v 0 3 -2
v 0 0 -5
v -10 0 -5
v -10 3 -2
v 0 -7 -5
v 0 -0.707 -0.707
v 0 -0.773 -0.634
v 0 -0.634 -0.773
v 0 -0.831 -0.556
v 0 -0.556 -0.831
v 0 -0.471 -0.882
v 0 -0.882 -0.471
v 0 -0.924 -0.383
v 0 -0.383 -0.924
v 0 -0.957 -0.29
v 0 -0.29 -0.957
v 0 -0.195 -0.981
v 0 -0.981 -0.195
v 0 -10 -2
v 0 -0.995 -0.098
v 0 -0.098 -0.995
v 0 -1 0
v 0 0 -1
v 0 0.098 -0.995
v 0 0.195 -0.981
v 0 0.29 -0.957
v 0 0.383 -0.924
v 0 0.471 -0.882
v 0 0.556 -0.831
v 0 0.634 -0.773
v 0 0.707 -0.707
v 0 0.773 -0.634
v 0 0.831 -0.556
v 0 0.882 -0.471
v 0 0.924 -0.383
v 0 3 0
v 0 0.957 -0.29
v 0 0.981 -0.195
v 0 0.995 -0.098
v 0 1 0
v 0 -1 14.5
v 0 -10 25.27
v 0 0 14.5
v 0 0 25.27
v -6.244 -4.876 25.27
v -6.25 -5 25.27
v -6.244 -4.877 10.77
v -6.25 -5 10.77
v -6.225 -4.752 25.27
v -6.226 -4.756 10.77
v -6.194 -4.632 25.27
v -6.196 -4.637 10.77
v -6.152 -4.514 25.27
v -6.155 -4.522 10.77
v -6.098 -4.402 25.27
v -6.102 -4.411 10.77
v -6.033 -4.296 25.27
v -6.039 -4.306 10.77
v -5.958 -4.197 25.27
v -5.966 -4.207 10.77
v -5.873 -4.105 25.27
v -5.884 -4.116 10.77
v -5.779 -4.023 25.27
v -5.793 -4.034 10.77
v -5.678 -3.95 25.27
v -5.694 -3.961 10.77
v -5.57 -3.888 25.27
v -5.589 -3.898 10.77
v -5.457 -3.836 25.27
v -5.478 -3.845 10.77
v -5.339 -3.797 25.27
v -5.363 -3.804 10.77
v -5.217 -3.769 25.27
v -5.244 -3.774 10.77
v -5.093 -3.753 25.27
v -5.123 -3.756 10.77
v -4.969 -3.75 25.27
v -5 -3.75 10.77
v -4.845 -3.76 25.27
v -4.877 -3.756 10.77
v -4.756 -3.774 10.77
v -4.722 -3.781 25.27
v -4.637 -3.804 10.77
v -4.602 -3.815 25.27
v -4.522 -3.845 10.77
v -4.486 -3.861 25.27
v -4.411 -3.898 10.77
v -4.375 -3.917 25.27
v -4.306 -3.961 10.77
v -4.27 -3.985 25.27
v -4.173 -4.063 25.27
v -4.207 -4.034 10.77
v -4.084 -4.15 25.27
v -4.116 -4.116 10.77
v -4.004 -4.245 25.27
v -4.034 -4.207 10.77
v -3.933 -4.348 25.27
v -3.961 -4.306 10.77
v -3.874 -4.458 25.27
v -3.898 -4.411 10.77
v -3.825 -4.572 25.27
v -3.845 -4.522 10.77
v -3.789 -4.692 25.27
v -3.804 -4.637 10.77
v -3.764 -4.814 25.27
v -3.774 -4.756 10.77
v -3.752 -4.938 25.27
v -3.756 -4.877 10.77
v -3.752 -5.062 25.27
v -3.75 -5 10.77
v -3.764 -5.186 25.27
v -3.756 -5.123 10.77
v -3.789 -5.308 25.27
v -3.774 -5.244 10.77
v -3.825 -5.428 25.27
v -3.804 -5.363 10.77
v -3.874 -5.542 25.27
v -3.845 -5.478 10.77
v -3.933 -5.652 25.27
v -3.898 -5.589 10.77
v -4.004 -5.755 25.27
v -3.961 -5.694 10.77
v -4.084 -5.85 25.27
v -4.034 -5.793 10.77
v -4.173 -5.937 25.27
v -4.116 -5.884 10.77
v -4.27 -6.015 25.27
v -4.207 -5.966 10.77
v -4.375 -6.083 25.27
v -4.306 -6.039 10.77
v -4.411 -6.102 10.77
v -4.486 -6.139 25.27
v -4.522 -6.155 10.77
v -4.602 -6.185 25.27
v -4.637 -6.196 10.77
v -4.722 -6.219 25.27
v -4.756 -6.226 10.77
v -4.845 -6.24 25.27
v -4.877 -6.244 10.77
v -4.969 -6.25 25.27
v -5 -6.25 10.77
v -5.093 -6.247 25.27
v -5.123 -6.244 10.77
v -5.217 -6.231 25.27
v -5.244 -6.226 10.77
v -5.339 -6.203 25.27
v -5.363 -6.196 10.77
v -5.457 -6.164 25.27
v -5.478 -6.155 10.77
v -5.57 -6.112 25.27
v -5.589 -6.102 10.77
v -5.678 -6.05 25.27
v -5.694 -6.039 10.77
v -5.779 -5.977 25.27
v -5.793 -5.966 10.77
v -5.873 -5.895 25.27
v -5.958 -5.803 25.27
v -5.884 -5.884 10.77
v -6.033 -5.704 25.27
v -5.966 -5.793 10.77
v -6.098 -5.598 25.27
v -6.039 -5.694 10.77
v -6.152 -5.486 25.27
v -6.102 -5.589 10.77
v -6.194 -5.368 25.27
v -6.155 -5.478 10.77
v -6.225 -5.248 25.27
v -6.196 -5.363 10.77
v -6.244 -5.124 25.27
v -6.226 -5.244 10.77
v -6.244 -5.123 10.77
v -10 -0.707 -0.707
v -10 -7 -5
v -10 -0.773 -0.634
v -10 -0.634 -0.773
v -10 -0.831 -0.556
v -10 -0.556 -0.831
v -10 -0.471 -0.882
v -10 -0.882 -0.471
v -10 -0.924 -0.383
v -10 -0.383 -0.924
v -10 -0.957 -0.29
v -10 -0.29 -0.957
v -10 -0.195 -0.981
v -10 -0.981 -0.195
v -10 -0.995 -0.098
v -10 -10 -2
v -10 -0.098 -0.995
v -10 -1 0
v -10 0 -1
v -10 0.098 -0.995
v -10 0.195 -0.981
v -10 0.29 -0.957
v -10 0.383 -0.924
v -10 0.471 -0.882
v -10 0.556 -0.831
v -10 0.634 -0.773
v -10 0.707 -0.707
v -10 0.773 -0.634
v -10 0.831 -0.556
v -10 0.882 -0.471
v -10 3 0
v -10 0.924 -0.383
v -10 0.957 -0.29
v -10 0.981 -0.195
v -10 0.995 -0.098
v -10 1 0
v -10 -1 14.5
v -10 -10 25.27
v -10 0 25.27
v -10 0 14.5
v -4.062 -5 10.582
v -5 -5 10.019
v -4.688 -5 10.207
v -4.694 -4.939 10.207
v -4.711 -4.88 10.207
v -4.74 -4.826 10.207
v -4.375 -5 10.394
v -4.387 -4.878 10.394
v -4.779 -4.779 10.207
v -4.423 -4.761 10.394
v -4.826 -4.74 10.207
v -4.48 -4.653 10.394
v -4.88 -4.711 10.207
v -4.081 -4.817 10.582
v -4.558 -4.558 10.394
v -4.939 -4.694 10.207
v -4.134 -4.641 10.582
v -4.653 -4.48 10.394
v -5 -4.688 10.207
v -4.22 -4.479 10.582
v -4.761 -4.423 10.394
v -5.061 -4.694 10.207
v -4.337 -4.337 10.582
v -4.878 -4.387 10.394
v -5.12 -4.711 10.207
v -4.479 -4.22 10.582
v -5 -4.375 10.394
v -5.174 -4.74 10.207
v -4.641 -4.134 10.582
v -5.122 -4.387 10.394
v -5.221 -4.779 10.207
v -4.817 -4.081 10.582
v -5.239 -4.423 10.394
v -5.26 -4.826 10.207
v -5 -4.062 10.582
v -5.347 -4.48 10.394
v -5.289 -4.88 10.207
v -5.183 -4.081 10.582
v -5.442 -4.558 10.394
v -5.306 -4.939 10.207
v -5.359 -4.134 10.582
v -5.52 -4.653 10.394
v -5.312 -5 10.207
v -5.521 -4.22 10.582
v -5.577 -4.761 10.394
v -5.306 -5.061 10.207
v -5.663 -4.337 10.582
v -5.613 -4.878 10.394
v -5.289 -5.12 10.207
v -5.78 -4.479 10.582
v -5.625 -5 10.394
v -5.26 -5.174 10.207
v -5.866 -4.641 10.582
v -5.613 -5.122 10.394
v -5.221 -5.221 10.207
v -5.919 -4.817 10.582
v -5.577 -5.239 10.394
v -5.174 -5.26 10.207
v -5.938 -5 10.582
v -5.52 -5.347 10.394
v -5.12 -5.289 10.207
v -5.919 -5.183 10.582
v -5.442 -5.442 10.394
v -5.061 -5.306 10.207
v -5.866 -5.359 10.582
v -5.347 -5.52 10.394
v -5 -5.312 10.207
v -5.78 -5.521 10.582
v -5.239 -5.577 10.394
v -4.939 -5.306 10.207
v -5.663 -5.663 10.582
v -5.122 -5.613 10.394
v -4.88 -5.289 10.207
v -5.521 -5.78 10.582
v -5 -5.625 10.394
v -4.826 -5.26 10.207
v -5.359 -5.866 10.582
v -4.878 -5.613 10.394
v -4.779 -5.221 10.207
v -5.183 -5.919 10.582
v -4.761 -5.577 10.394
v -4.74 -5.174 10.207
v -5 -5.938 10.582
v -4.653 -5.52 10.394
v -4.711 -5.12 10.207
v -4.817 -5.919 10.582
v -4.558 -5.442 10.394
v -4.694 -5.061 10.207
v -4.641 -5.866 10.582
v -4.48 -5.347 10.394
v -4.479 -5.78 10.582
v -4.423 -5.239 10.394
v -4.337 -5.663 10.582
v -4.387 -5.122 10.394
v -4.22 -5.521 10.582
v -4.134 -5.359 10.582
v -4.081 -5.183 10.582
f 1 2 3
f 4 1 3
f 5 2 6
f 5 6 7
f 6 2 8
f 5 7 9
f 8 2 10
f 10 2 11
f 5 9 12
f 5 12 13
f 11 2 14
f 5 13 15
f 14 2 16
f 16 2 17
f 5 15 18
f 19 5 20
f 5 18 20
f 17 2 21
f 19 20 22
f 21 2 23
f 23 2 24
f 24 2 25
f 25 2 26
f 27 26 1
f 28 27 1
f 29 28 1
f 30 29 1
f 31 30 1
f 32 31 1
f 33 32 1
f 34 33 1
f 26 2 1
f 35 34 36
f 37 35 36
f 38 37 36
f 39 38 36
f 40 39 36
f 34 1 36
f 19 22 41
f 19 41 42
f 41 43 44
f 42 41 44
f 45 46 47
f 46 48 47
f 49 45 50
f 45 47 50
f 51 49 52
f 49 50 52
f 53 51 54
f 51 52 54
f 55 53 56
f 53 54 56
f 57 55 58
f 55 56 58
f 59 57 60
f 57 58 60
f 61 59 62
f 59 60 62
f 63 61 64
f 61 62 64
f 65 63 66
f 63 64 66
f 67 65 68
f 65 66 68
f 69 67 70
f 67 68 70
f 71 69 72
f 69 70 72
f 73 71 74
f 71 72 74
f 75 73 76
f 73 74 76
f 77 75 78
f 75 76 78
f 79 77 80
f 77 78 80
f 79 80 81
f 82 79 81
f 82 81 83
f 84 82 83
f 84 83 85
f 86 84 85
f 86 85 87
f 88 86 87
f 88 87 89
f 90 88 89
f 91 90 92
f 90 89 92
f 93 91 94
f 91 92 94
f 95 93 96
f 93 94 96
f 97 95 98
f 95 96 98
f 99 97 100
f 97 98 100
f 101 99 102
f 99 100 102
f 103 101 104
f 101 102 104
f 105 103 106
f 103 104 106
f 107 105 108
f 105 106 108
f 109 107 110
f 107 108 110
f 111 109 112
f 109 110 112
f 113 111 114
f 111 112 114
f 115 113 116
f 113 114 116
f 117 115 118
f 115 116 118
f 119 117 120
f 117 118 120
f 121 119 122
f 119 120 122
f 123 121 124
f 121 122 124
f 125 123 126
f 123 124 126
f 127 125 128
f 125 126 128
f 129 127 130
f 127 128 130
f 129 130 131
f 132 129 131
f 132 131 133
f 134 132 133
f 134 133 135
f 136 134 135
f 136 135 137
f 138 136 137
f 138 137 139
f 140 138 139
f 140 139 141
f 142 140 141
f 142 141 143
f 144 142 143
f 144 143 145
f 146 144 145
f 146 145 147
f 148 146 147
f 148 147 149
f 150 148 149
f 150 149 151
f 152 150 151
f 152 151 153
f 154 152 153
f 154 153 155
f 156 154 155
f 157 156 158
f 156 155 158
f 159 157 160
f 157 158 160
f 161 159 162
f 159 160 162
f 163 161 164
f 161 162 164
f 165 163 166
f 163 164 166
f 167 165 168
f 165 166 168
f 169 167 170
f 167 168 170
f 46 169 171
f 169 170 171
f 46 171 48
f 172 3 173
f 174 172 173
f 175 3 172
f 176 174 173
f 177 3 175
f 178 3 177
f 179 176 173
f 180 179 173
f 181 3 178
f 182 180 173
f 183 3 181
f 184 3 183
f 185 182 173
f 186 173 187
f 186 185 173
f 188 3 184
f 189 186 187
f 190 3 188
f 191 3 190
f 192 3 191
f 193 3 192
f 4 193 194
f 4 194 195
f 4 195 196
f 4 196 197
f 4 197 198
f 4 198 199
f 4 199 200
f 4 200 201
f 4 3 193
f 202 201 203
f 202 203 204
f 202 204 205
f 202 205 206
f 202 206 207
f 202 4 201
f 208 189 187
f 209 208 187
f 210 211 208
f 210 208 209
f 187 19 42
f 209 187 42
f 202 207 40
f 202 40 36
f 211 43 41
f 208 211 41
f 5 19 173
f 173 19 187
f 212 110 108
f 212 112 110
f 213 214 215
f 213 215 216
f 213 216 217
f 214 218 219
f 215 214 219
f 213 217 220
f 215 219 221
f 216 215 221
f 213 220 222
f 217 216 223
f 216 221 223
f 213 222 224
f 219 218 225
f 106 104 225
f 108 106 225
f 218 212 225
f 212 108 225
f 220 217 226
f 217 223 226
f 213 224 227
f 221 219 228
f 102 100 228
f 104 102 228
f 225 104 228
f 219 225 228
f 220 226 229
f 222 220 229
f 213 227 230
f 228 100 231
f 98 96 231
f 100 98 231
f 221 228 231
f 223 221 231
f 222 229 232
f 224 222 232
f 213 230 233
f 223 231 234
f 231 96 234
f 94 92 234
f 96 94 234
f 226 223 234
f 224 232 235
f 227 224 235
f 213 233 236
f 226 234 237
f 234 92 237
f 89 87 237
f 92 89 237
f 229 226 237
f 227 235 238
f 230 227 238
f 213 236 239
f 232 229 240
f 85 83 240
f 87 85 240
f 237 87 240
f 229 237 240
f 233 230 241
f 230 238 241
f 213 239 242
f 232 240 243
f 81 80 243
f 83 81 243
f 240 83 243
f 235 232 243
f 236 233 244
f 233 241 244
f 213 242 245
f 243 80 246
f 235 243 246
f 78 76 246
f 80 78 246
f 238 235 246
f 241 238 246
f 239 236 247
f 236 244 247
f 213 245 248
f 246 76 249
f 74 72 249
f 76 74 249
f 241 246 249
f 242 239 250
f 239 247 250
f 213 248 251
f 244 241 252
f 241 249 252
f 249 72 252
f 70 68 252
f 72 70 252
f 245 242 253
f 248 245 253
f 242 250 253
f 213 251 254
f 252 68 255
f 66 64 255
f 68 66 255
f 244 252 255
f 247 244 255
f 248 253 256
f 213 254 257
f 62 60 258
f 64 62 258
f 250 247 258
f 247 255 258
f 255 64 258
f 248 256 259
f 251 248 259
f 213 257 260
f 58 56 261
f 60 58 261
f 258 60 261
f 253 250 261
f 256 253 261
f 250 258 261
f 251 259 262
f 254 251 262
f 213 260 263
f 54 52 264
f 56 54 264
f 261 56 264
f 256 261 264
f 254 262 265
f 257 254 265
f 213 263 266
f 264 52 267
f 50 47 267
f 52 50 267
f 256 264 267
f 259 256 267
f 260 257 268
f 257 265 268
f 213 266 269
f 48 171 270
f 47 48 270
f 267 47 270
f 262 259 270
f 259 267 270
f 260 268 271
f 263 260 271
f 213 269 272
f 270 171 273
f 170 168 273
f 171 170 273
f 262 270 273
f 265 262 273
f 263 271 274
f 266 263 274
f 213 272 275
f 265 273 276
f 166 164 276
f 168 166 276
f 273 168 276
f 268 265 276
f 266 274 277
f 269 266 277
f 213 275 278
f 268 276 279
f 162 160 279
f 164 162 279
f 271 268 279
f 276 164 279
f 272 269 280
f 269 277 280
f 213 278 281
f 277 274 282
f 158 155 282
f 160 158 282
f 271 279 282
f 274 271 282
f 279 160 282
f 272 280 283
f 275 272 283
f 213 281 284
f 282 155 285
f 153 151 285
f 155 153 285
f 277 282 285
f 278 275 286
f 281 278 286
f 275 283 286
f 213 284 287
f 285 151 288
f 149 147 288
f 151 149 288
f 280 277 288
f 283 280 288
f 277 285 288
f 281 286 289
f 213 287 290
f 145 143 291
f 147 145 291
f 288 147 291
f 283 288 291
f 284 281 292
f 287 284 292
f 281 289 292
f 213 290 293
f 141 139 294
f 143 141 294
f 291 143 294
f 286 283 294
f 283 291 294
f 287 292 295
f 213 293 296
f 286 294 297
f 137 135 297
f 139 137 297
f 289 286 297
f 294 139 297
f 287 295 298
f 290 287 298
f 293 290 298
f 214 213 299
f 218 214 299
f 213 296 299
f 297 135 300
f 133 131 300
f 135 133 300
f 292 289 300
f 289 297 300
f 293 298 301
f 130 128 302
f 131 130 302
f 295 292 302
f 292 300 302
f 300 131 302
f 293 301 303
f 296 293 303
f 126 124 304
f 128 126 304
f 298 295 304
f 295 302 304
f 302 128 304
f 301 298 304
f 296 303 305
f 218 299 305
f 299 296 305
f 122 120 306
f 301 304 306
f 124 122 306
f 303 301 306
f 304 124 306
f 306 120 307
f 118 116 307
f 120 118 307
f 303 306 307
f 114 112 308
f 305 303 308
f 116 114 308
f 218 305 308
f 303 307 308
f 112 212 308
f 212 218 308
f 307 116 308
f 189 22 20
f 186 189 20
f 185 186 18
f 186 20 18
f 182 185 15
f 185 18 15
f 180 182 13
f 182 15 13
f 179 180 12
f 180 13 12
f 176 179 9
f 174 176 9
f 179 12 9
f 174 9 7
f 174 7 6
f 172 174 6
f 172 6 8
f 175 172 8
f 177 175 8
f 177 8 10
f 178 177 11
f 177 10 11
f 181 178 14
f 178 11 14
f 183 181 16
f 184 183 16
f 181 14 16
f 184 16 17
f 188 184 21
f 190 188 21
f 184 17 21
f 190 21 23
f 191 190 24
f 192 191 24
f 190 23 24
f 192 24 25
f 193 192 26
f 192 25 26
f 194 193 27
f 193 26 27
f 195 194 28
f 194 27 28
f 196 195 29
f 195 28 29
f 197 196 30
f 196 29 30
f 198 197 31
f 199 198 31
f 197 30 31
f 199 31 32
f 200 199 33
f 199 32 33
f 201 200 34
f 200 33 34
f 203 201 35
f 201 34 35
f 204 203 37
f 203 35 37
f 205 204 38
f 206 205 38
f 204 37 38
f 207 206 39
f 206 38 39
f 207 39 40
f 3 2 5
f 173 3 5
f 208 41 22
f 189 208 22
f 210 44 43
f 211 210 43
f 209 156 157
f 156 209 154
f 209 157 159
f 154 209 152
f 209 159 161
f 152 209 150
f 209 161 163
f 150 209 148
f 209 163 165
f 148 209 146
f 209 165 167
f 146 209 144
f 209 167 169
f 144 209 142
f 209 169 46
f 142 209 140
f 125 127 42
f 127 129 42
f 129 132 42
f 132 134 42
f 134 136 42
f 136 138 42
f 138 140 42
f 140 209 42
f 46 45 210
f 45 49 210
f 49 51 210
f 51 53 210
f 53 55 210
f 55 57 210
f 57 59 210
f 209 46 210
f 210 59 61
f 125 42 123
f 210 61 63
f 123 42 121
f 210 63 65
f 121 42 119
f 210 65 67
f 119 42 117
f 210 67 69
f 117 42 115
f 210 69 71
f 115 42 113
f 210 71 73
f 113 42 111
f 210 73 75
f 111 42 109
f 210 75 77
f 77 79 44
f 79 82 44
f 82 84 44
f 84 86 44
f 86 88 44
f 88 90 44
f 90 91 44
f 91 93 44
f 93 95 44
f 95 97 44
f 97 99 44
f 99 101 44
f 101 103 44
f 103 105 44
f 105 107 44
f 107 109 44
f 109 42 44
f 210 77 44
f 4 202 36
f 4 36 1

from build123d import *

# Parameters (mm, degrees)
BOSS_EXTRUDE1_DEPTH       = 10
CHAMFER1_SIZE             = 3
M3X0_5_TAPPED_HOLE1_D     = 2.5
M3X0_5_TAPPED_HOLE1_DEPTH = 14.5
M3X0_5_TAPPED_HOLE1_TIP   = 0.751075774


with BuildPart() as part:
    # Sketch1 → Boss-Extrude1 (new body)
    with BuildSketch(Plane(origin=(0, 0, 0), x_dir=(0, 0, -1), z_dir=(1, 0, 0))):
        with BuildLine():
            Line((0, 1), (0, 3))
            Line((0, 3), (5, 3))
            Line((5, 3), (5, -10))
            Line((5, -10), (-25.27, -10))
            Line((-25.27, -10), (-25.27, 0))
            Line((-25.27, 0), (-14.5, 0))
            Line((-14.5, 0), (-14.5, -1))
            Line((-14.5, -1), (0, -1))
            ThreePointArc((0, -1), (1, 0), (0, 1))
        make_face()
    extrude(amount=-BOSS_EXTRUDE1_DEPTH)

    # Chamfer1
    chamfer1_edges = [part.edges().sort_by_distance(p)[0] for p in [
        (-5, 3, -5),
        (-5, -10, -5),
    ]]
    chamfer(chamfer1_edges, length=CHAMFER1_SIZE)

    # M3x0.5 Tapped Hole1
    with Locations(Plane(origin=(-5, -5, 25.27), x_dir=(1, 0, 0), z_dir=(0, 0, 1))):
        with Locations((0, 0)):
            Hole(M3X0_5_TAPPED_HOLE1_D / 2, depth=M3X0_5_TAPPED_HOLE1_DEPTH)
            with Locations((0, 0, -(M3X0_5_TAPPED_HOLE1_DEPTH + M3X0_5_TAPPED_HOLE1_TIP / 2))):  # 118° drill point
                Cone(0, M3X0_5_TAPPED_HOLE1_D / 2, M3X0_5_TAPPED_HOLE1_TIP, mode=Mode.SUBTRACT)


solid = part.part
